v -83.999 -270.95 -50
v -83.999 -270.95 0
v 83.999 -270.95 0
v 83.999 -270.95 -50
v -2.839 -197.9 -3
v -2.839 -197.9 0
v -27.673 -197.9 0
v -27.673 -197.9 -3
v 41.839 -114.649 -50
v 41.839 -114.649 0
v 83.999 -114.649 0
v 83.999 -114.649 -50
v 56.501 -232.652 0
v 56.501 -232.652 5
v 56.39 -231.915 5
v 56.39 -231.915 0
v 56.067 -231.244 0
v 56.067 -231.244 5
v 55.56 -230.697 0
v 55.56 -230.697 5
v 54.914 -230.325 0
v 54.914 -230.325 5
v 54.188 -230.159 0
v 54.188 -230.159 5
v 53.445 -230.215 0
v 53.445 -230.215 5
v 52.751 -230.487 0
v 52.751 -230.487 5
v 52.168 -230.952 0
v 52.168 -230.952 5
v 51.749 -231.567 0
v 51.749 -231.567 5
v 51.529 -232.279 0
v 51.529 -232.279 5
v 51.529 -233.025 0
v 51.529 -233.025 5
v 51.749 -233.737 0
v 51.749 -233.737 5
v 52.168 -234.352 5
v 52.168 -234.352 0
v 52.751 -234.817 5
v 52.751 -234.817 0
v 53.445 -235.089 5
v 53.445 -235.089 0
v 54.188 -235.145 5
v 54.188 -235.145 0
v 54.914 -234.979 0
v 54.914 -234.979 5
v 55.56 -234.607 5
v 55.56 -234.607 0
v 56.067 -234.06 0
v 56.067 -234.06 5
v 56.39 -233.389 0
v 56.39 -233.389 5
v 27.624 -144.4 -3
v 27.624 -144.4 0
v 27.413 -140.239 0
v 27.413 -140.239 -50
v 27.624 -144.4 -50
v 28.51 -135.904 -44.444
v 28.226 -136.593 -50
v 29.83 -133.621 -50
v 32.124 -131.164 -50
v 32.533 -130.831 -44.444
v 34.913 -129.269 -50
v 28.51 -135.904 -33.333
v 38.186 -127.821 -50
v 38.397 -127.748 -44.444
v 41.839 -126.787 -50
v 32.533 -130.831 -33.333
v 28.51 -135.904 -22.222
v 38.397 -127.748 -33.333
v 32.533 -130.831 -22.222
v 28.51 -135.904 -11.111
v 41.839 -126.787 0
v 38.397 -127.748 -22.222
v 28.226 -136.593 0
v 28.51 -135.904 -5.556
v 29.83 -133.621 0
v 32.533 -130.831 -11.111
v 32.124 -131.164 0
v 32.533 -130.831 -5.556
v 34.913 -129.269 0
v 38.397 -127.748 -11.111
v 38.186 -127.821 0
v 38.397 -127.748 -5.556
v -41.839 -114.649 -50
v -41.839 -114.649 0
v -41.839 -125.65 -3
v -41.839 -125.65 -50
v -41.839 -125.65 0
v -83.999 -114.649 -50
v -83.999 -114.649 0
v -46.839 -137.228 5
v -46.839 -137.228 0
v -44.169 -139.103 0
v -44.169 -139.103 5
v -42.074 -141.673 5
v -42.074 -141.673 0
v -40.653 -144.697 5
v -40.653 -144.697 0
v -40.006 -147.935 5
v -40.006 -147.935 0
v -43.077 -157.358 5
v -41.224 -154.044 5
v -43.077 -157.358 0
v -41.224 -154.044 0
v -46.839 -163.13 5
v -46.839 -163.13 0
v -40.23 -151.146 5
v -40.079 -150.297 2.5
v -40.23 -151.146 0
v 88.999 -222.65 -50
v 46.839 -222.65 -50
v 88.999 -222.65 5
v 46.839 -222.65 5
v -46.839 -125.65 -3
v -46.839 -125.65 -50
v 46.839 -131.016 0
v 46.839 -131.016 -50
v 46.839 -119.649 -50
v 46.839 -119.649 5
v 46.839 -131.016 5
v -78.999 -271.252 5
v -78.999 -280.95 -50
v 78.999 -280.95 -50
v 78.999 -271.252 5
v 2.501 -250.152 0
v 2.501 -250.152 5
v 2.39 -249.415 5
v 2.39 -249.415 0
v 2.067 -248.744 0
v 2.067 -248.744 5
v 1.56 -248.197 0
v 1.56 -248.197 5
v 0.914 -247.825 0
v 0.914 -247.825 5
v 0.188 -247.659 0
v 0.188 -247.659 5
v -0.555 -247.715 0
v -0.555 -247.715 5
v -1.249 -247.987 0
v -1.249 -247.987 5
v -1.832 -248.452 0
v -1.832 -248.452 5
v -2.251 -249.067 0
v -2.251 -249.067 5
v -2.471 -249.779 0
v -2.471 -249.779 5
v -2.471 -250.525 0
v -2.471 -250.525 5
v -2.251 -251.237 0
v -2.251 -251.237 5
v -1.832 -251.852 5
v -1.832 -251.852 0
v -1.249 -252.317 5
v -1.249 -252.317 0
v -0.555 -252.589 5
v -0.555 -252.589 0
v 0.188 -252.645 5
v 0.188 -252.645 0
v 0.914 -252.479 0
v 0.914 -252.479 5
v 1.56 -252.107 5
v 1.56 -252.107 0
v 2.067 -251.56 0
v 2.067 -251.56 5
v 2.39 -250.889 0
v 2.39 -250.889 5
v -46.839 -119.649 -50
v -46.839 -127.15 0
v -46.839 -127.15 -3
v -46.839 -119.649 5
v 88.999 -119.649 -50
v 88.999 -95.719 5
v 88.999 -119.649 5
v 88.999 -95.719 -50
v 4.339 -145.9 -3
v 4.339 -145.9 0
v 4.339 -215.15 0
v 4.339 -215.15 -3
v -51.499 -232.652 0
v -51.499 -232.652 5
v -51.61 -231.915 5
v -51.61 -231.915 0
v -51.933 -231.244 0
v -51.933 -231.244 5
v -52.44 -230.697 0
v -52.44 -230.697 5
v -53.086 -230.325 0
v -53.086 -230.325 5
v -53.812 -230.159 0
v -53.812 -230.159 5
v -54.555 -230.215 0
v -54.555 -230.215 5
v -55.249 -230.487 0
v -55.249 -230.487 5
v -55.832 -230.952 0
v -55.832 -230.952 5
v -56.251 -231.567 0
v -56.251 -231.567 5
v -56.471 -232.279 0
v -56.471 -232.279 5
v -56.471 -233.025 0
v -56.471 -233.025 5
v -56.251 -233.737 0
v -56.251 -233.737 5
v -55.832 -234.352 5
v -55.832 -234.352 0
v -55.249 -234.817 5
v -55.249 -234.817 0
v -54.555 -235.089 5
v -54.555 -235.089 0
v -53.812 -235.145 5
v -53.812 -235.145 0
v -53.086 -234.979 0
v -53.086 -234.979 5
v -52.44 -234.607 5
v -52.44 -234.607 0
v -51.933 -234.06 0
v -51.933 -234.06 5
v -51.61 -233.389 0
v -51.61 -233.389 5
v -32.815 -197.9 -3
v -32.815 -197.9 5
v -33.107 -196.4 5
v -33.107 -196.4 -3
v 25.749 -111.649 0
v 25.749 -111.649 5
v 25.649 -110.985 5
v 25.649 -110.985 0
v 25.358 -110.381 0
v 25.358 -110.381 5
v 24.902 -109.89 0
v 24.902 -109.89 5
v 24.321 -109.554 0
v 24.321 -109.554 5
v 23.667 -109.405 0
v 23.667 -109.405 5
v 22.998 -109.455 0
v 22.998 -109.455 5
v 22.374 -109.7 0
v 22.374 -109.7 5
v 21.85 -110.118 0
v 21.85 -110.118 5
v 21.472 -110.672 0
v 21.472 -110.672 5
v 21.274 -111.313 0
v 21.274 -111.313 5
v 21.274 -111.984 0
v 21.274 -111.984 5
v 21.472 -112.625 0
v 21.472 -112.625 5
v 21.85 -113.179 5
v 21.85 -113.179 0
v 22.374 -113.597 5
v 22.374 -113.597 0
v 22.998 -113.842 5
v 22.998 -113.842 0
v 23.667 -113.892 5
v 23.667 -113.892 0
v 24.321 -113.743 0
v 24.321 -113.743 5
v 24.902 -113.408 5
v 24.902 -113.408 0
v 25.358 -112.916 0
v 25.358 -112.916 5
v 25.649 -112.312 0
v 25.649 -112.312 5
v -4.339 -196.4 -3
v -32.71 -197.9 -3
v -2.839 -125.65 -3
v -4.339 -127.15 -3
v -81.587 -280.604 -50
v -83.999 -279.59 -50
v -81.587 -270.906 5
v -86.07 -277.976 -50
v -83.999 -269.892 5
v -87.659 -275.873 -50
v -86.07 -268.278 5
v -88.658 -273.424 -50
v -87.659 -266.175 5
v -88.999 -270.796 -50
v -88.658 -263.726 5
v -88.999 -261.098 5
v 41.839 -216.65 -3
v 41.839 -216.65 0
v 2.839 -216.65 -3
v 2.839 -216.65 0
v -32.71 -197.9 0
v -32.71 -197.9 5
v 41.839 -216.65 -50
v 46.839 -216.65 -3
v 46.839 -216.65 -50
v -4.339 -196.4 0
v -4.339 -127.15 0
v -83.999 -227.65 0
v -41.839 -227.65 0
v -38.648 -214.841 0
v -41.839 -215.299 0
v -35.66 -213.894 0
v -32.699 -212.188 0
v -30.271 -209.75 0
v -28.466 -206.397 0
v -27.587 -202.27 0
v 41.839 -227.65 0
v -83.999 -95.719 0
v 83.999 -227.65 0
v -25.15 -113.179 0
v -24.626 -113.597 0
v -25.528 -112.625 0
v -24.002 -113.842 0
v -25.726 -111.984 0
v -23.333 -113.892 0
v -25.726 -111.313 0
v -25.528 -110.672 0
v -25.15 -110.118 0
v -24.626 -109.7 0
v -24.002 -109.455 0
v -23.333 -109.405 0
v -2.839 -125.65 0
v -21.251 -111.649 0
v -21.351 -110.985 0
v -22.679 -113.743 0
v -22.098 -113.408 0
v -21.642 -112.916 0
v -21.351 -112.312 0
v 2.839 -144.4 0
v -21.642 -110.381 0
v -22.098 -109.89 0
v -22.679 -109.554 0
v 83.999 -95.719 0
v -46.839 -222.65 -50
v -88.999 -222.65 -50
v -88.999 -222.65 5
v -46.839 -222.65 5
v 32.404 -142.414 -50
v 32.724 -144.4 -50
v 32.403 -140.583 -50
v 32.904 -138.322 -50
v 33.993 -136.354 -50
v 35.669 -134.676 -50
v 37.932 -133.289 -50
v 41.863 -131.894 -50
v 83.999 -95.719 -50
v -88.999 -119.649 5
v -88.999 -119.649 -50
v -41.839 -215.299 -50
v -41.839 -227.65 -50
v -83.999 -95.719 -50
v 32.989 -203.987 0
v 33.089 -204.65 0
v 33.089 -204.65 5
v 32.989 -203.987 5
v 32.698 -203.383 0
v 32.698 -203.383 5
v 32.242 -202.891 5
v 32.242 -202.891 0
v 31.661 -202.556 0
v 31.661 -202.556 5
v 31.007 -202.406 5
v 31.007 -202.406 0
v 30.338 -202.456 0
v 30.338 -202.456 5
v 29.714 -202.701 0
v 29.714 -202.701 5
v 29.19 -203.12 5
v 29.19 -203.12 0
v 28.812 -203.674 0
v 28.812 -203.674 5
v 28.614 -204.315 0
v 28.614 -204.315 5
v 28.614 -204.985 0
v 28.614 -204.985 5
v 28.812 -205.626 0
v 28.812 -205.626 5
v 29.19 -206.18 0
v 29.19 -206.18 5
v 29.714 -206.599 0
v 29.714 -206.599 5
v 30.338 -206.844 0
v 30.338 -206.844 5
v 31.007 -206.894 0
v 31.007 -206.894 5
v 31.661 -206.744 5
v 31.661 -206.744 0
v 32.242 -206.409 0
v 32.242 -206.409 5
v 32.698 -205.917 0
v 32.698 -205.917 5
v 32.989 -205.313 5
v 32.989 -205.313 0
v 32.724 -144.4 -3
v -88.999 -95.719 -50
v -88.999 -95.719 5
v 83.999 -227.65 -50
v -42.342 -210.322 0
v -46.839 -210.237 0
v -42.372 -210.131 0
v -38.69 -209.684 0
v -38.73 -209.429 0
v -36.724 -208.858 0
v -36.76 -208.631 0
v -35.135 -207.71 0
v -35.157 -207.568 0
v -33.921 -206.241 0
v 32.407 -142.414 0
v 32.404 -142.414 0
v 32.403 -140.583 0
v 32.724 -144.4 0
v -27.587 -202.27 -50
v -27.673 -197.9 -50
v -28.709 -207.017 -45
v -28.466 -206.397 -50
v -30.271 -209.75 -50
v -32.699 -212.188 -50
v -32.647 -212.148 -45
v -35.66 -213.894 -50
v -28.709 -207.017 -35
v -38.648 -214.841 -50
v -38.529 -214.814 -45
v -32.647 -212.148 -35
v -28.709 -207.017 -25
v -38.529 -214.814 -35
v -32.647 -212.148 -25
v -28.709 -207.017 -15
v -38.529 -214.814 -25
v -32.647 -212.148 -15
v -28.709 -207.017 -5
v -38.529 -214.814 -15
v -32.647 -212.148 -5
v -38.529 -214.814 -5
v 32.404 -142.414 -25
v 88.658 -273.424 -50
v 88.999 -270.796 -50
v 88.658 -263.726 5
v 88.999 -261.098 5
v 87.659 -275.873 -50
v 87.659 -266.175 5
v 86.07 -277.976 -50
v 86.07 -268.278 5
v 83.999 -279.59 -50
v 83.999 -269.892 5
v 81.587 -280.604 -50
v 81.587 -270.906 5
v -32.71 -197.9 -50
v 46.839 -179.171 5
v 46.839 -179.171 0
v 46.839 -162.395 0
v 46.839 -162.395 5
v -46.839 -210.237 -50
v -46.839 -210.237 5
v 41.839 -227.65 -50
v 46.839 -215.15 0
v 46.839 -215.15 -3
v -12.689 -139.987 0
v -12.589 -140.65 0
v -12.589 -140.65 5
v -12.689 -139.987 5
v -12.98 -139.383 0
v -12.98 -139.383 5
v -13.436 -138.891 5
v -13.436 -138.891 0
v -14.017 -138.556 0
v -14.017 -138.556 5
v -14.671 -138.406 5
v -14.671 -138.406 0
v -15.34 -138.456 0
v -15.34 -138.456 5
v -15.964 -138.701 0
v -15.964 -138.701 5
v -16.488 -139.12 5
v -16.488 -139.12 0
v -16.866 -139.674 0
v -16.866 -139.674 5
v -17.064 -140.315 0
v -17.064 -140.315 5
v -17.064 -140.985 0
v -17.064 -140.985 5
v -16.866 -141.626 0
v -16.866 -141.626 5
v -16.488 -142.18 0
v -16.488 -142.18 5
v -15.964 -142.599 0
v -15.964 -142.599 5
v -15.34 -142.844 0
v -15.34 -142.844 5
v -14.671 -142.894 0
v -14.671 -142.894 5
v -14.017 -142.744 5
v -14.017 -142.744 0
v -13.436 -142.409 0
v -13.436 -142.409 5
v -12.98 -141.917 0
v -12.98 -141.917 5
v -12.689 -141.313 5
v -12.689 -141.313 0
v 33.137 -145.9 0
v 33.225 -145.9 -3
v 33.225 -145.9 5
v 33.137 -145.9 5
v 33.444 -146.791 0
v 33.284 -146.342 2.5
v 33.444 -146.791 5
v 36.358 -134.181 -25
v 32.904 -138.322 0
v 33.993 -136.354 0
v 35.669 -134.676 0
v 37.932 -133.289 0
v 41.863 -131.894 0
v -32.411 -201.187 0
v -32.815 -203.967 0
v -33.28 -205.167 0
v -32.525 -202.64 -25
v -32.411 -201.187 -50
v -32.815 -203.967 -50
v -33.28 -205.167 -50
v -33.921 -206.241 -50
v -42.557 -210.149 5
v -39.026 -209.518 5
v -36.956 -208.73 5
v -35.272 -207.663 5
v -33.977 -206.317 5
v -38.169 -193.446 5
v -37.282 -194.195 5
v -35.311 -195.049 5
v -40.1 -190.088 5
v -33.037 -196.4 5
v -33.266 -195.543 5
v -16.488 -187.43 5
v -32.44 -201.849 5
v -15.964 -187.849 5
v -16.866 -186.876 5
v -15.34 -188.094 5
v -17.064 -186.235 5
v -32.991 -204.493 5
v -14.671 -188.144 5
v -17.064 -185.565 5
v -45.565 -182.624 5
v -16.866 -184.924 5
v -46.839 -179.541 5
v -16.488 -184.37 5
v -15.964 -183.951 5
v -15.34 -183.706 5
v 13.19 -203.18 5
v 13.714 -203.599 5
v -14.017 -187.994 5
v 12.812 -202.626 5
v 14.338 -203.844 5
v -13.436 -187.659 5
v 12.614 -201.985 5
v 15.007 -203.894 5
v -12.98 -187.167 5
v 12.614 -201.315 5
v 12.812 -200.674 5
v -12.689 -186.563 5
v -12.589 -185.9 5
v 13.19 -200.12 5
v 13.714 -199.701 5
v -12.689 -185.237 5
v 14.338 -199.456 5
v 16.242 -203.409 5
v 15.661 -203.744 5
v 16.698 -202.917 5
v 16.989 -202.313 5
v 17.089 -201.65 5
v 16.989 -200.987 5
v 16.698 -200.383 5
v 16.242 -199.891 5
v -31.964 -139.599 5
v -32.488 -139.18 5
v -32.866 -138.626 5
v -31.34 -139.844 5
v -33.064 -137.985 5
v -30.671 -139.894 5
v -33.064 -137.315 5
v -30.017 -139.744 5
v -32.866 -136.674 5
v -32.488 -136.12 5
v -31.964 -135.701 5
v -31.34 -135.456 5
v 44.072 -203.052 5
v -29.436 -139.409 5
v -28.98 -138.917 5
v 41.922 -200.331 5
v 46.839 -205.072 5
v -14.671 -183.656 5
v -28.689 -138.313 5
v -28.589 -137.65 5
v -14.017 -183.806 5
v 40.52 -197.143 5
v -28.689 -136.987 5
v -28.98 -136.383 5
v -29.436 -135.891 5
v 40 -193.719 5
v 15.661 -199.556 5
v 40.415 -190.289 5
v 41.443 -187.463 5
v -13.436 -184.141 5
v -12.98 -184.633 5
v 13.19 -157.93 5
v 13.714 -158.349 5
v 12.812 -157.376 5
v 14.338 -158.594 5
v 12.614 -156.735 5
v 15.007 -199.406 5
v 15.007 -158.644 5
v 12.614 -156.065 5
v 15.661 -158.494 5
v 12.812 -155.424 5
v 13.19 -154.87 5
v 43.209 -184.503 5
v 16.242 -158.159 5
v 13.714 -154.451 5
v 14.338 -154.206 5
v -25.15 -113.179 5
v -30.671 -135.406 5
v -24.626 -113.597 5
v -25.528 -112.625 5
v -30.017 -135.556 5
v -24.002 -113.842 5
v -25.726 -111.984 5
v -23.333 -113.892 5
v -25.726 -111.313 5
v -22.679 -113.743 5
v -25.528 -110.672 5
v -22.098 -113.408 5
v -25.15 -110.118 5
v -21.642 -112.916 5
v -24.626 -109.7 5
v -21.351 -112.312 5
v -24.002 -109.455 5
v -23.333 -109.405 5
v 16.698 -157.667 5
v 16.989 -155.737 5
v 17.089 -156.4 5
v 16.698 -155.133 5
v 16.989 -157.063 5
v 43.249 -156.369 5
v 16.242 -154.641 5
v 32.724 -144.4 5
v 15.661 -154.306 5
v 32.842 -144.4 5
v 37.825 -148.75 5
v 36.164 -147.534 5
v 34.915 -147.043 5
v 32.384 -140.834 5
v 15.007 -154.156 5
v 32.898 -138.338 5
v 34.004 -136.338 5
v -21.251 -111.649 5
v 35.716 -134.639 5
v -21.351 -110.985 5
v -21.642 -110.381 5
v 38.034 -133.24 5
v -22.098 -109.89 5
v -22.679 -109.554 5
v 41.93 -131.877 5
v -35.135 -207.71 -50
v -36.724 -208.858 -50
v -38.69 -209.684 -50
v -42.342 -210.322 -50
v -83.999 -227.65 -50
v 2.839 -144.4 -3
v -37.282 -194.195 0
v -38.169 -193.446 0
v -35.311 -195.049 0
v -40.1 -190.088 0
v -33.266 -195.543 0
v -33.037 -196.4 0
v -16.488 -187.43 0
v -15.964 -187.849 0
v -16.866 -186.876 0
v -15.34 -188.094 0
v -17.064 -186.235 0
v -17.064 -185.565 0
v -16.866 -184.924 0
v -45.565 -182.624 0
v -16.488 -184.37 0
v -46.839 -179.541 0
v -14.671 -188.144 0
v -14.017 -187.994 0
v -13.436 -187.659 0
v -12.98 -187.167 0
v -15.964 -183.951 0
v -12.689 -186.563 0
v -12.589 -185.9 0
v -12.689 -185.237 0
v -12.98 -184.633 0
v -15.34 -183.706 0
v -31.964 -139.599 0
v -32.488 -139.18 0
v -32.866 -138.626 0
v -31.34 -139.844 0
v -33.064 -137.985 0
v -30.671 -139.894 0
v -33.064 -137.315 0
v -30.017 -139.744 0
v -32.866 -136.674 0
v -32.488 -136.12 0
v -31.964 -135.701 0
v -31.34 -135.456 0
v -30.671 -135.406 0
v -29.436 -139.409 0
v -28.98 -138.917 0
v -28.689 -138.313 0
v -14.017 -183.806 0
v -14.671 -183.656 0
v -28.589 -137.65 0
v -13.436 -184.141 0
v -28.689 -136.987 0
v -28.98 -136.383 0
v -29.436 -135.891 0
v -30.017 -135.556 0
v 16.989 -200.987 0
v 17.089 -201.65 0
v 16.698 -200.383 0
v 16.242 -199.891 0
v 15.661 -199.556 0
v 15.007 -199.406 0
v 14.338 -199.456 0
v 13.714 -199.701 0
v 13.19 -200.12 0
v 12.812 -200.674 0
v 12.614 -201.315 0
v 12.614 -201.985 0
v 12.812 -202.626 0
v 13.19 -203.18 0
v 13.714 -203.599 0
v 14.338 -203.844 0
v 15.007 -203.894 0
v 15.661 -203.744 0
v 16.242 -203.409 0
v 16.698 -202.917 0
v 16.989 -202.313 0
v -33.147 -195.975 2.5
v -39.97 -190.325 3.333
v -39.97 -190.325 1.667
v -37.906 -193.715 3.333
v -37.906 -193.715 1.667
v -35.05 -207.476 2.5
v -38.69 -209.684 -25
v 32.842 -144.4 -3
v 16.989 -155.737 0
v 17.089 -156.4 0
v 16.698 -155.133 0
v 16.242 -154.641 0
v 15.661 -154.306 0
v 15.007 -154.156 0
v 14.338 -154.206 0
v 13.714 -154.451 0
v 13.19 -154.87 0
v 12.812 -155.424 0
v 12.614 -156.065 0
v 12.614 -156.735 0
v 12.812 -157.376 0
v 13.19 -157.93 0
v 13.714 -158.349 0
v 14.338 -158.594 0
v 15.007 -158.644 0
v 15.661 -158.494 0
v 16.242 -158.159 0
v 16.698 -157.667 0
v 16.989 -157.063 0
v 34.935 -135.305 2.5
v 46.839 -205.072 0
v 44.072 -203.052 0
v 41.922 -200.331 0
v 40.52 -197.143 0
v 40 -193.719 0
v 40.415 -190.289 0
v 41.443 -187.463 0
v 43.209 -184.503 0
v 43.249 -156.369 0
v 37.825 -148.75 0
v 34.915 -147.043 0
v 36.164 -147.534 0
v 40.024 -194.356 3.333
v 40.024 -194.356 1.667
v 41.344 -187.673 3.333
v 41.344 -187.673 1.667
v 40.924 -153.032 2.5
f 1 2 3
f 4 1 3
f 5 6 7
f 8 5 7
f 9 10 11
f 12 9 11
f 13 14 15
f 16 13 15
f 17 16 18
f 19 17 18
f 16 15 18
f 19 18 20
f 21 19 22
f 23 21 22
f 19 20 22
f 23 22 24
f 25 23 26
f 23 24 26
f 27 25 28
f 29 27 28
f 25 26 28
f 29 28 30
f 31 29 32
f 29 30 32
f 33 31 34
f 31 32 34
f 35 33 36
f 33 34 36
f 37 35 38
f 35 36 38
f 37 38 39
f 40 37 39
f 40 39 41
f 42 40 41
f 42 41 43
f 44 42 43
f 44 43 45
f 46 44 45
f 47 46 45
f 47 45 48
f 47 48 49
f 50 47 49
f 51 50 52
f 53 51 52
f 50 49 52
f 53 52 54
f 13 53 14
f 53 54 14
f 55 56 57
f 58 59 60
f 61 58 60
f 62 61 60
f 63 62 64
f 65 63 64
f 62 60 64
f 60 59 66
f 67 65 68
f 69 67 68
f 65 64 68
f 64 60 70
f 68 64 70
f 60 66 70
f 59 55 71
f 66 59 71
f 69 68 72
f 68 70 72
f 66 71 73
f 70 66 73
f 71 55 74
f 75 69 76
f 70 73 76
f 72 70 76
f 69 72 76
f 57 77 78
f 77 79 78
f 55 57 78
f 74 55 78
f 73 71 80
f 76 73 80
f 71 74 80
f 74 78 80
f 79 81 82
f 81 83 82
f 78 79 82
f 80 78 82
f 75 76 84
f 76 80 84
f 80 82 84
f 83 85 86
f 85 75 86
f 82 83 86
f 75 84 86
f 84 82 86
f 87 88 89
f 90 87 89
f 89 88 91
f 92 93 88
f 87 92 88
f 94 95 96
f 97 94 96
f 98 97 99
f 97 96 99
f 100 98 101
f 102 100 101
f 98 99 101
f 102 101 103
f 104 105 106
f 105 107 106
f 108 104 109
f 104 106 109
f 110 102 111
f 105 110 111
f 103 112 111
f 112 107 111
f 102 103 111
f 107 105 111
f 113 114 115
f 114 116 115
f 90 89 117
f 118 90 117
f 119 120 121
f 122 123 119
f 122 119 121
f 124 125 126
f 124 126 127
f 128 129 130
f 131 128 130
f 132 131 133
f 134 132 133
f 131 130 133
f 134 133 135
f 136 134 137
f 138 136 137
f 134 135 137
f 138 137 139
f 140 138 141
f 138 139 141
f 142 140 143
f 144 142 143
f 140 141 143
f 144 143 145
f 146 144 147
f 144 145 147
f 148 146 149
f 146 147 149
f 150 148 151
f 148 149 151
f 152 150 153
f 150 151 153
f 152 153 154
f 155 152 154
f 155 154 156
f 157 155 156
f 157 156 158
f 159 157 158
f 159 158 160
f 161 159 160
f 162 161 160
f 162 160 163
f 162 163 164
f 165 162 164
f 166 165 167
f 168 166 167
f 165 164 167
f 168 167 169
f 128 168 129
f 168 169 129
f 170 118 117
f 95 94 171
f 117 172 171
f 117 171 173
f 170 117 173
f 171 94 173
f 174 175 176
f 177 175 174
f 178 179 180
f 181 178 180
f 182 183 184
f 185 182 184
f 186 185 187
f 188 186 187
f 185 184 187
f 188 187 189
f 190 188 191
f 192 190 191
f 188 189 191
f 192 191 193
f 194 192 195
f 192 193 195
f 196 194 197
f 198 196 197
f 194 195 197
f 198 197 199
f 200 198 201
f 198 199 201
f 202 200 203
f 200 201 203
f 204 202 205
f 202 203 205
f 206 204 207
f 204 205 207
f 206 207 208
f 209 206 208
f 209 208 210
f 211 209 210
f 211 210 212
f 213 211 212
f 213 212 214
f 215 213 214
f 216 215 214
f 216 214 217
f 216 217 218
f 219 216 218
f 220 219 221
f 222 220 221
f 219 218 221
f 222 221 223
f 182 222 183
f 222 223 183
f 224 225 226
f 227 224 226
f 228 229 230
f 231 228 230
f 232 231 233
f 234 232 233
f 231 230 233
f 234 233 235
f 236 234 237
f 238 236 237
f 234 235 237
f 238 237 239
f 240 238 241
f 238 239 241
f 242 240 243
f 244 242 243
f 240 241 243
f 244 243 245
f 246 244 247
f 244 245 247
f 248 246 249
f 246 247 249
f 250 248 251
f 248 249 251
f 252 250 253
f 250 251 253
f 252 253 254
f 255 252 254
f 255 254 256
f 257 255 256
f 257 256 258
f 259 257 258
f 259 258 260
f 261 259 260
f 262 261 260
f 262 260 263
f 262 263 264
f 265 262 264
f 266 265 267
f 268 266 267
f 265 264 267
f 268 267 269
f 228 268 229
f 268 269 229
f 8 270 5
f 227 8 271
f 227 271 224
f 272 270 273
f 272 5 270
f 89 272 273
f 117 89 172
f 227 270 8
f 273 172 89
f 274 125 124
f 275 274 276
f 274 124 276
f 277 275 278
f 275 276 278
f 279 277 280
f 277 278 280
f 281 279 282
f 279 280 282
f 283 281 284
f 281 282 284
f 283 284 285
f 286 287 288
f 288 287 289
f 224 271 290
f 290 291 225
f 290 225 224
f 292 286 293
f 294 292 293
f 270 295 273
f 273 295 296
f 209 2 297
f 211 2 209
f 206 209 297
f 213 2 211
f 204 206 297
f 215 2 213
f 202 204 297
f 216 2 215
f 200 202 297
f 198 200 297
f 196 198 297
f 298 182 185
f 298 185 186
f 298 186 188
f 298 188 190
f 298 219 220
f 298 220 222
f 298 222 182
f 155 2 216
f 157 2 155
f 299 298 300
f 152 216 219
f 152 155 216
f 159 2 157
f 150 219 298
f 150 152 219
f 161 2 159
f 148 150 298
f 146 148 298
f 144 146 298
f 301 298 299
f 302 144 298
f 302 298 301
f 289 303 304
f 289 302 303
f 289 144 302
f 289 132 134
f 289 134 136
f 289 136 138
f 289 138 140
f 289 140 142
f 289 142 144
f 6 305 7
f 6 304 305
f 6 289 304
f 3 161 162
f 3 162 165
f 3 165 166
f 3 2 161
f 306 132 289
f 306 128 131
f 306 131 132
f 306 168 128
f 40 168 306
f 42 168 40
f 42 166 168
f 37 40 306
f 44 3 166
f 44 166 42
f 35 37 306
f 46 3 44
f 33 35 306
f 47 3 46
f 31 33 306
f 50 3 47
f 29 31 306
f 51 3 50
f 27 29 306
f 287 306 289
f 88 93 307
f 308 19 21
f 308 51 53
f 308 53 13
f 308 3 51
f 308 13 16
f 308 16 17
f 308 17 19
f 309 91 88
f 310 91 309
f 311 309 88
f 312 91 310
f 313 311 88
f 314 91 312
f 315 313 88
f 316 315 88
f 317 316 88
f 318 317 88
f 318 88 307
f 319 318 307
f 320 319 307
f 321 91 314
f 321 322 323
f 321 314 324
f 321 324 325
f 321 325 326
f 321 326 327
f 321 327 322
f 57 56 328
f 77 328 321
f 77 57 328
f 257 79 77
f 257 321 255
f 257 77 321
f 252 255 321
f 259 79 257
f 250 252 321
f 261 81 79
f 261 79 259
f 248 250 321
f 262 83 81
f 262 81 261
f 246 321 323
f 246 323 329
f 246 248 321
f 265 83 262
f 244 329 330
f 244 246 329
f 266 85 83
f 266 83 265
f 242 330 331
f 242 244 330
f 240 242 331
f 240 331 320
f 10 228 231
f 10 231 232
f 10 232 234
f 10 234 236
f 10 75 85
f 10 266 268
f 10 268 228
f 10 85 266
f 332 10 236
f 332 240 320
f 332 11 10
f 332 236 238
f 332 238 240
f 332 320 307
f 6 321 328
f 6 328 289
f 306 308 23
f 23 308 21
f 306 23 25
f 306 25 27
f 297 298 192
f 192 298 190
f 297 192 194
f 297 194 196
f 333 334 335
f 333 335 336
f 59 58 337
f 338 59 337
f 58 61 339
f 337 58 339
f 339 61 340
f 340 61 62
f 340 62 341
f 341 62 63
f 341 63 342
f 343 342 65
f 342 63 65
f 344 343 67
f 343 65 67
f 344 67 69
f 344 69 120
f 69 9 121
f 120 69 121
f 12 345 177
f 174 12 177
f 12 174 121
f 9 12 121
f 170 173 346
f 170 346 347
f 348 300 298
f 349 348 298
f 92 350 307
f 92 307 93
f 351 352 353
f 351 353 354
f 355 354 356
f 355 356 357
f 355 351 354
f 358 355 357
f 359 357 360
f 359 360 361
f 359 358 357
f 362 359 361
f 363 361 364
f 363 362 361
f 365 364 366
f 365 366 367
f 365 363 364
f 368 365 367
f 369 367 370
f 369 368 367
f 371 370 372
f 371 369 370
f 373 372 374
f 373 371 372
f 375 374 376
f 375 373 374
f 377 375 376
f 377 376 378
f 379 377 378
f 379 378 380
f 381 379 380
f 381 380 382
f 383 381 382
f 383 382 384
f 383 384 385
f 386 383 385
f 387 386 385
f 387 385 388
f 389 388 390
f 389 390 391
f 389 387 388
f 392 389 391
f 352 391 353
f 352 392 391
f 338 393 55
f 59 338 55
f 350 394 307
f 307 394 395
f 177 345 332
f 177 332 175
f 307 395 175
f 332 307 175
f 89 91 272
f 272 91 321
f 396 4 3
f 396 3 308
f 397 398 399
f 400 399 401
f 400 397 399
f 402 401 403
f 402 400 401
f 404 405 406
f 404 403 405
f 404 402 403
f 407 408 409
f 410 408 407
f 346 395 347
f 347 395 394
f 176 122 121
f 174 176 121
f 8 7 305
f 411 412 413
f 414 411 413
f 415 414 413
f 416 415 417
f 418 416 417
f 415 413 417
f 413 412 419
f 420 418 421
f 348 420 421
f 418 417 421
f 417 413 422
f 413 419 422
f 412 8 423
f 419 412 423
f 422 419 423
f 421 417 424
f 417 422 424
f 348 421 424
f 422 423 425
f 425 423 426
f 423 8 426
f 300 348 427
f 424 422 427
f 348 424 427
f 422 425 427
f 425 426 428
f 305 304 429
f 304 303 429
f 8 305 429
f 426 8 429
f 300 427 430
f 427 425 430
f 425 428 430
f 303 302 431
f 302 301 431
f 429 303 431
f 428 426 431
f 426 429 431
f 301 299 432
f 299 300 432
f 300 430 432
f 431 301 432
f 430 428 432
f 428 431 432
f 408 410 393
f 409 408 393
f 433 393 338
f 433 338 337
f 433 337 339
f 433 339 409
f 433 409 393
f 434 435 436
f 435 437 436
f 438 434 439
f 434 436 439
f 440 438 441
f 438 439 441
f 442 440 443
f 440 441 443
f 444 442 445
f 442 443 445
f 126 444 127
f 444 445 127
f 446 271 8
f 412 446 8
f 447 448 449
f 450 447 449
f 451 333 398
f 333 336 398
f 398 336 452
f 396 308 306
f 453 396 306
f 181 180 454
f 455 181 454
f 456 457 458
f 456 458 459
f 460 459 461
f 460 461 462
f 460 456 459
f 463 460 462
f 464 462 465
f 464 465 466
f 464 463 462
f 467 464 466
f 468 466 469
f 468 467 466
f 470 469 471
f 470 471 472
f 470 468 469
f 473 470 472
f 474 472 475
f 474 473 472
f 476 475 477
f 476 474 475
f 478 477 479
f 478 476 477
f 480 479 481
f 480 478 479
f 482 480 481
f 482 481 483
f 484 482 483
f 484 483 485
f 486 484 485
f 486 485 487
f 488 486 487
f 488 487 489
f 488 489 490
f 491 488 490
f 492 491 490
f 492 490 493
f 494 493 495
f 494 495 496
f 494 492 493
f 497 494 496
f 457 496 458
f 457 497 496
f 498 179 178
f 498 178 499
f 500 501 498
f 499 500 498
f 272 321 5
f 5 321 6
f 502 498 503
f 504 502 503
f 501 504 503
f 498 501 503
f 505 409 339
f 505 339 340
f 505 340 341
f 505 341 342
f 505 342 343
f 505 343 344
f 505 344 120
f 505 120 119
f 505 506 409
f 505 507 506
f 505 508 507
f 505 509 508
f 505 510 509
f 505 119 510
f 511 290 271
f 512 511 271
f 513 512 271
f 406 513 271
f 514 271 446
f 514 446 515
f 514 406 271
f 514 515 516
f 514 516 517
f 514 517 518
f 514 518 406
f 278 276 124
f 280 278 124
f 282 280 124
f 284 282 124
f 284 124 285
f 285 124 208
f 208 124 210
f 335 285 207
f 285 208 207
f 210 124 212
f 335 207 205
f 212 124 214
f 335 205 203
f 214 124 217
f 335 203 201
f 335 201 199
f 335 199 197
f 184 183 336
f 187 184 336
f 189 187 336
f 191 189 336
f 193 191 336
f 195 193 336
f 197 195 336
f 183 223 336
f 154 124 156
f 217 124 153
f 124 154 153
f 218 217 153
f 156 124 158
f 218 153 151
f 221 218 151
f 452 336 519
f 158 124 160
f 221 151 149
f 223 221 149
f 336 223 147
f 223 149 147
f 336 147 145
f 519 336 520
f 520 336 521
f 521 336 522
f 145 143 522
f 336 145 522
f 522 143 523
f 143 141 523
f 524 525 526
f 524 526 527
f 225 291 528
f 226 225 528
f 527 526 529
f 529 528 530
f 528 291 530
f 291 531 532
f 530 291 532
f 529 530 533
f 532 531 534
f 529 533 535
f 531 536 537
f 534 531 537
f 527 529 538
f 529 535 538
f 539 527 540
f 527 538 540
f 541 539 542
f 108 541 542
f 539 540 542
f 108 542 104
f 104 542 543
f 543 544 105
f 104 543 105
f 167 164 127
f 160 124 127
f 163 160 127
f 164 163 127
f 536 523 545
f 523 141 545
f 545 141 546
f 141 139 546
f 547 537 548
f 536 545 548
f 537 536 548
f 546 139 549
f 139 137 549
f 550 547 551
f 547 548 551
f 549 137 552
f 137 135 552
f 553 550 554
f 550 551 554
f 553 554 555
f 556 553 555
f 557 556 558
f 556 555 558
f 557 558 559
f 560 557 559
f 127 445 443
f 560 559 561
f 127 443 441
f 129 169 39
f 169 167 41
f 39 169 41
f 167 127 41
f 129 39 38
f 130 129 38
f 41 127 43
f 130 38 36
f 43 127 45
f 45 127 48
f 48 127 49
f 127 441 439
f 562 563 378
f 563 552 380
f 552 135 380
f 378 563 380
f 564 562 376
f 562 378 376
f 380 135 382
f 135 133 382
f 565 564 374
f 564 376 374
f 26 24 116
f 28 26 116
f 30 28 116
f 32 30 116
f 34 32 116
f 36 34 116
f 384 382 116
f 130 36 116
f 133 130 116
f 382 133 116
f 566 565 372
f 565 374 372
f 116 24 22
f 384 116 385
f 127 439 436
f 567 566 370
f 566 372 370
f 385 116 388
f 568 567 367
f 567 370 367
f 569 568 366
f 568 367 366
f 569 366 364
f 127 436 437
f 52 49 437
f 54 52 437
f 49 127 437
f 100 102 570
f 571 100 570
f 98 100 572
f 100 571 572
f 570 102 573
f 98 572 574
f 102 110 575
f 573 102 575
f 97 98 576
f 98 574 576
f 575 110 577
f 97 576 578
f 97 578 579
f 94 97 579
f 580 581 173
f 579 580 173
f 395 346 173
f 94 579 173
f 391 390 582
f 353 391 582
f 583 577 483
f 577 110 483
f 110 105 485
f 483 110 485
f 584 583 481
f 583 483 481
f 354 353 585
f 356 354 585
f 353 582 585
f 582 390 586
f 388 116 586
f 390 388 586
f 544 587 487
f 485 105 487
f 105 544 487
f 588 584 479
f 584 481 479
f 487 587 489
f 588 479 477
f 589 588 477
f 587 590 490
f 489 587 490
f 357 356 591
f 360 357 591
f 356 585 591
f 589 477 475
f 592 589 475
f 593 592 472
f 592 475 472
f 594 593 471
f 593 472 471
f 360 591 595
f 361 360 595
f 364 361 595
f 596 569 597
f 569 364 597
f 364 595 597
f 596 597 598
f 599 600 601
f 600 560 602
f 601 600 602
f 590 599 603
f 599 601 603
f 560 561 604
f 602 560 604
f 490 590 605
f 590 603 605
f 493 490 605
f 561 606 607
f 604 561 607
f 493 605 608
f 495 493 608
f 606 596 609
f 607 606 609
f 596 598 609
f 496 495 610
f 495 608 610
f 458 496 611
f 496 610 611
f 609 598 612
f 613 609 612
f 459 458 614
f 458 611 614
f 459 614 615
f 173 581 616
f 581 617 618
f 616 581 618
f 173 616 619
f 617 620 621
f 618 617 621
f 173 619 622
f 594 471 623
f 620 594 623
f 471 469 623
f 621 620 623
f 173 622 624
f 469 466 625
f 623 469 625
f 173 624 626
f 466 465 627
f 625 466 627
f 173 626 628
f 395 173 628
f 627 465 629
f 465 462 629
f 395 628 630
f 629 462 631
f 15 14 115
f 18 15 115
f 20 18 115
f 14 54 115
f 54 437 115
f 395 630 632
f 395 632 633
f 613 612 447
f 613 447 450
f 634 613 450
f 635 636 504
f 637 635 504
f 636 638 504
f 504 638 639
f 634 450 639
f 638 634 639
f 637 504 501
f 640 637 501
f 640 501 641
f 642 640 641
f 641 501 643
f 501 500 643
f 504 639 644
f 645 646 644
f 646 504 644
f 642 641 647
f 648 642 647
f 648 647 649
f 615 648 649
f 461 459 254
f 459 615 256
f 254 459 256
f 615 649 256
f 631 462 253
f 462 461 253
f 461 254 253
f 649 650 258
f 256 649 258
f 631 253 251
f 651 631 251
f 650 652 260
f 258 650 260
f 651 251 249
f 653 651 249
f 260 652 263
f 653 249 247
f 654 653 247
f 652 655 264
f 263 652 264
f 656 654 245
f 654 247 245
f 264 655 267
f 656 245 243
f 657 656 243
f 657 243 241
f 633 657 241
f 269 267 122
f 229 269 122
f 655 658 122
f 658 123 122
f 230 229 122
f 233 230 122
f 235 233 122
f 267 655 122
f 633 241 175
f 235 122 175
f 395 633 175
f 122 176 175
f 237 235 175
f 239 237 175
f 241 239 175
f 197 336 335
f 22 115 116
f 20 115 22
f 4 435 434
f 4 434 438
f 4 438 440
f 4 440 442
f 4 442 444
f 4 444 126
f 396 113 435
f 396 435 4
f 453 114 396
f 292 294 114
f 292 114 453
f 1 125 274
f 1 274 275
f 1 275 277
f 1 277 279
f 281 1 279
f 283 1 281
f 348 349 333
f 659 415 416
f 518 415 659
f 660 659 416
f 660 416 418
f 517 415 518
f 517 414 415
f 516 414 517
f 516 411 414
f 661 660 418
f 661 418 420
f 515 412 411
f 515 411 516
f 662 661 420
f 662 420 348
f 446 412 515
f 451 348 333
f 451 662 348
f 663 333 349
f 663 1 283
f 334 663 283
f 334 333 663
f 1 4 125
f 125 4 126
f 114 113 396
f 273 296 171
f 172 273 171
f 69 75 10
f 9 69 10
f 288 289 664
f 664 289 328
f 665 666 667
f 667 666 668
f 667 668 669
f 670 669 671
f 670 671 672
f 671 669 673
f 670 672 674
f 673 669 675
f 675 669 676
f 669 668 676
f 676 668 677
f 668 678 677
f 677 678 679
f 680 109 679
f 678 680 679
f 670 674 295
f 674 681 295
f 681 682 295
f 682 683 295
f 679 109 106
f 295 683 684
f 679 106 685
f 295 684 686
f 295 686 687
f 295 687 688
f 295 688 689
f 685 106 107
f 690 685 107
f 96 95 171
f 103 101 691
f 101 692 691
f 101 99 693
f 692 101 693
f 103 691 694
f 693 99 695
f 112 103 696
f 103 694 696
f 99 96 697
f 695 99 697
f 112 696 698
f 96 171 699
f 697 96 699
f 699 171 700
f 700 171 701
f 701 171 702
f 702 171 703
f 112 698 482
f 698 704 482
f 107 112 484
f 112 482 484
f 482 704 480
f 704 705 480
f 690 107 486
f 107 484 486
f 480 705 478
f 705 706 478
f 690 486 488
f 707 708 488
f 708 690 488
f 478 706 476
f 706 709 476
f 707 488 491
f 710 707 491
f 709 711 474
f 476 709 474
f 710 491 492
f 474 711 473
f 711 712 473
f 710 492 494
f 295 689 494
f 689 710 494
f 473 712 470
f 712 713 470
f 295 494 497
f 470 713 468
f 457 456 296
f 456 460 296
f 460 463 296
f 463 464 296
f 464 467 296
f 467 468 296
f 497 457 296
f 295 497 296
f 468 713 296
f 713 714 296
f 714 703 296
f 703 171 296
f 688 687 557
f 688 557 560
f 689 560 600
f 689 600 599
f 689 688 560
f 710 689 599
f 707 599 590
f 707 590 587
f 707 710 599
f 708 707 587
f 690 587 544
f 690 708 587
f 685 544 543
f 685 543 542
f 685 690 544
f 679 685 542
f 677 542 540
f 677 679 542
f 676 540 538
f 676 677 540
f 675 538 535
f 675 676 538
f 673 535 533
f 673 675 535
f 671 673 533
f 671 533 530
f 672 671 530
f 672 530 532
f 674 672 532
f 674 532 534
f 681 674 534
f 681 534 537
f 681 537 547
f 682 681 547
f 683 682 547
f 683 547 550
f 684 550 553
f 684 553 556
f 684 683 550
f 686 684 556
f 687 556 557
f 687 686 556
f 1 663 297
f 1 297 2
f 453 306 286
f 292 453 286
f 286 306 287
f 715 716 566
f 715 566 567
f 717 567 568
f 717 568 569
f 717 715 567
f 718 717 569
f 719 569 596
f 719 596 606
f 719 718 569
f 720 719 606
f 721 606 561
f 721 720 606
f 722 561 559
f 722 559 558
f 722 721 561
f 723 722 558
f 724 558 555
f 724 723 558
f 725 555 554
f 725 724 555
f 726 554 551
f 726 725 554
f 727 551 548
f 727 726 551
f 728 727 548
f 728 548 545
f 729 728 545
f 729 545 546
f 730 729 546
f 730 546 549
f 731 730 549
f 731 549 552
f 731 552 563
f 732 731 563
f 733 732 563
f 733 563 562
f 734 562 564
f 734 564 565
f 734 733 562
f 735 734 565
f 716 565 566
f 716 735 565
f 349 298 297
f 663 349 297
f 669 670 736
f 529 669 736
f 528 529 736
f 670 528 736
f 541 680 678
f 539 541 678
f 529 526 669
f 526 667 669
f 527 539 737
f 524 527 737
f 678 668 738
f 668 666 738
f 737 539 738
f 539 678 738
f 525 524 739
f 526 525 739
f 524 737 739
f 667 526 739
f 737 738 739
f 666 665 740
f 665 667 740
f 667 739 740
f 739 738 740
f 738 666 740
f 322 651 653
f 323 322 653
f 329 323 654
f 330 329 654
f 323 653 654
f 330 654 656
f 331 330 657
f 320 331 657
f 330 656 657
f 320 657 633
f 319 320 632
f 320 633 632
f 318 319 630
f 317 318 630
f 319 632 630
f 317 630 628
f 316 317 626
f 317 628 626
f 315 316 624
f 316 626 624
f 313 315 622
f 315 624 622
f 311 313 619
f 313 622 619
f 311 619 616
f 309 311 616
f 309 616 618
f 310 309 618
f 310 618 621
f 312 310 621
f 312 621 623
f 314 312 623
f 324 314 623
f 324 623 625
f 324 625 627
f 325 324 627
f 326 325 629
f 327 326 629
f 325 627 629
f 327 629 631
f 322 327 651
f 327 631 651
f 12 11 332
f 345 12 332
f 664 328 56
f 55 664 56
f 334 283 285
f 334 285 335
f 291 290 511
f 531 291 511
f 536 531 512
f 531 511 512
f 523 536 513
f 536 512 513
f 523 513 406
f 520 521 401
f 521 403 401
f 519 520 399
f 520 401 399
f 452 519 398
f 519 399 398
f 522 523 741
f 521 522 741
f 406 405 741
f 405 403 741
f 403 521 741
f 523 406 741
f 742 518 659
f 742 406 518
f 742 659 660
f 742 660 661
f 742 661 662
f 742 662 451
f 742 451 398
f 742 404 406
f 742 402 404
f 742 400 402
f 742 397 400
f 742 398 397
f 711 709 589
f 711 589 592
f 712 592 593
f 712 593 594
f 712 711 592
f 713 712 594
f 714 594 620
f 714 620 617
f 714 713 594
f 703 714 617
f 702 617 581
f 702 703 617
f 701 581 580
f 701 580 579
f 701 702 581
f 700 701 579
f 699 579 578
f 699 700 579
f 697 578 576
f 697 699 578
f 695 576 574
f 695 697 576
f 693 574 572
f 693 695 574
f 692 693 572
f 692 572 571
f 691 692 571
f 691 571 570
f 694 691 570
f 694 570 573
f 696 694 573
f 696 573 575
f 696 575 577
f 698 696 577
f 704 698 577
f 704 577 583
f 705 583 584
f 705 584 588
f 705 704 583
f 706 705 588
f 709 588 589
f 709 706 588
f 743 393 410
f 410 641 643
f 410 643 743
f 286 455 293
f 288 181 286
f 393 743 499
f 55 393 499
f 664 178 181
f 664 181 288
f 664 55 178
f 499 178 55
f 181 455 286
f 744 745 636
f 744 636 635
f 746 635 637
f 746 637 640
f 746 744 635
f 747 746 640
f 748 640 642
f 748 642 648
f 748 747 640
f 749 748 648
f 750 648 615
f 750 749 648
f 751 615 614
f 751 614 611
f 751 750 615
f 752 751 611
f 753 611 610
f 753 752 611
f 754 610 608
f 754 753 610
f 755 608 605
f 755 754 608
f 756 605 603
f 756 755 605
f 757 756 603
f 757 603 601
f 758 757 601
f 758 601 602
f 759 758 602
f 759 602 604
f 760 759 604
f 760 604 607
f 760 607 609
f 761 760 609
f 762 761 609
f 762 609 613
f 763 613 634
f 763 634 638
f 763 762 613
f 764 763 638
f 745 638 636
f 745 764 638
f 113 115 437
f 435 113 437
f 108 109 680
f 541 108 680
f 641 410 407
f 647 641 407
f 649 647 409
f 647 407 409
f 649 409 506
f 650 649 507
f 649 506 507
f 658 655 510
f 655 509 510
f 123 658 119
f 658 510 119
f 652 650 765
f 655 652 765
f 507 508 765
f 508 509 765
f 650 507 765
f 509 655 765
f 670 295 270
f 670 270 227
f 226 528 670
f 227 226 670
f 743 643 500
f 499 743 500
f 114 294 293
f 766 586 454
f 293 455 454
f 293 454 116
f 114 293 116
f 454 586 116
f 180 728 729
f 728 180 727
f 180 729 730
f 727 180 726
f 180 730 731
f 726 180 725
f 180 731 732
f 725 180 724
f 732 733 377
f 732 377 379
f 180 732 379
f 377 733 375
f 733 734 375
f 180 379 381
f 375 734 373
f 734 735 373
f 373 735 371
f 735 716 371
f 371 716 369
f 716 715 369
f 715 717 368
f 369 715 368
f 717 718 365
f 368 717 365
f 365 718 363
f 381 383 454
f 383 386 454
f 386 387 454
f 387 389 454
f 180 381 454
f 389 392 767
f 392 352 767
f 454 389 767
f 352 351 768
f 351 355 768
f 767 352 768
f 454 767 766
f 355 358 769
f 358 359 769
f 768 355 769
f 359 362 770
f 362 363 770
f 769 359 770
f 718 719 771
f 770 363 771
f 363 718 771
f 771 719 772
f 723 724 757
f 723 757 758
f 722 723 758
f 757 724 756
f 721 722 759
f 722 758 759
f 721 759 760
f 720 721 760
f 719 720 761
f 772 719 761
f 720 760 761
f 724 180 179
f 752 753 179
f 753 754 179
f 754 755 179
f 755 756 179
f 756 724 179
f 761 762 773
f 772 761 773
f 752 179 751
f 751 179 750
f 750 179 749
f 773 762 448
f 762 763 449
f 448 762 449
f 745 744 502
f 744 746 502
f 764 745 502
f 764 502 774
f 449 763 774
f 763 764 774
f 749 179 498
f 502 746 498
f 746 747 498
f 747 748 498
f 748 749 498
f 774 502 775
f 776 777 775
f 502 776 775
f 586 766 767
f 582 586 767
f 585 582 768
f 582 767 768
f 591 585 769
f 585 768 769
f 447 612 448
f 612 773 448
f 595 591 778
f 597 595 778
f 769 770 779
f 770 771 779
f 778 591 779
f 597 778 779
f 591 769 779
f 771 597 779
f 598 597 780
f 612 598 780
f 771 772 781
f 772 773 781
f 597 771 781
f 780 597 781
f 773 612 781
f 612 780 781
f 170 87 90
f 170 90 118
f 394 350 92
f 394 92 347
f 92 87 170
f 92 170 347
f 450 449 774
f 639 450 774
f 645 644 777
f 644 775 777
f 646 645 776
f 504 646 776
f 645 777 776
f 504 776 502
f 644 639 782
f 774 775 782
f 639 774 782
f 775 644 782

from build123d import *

# Parameters (mm, degrees)
SKETCH1_R            = 2.25
BOSS_EXTRUDE1_DEPTH  = 5
SKETCH7_R            = 2
CUT_EXTRUDE1_DEPTH   = 10
SKETCH10_W           = 93.677769422
SKETCH10_H           = 89.648680449
CUT_EXTRUDE4_DEPTH   = 10
LPATTERN1_COUNT      = 2
LPATTERN1_PITCH      = 144.65
SKETCH13_W           = 93.677769422
SKETCH13_H           = 54.298680449
BOSS_EXTRUDE2_DEPTH  = 5
SKETCH18_W           = 93.677769422
SKETCH18_H           = 5
BOSS_EXTRUDE5_DEPTH  = 5
BOSS_EXTRUDE7_DEPTH  = 8
SKETCH19_W           = 93.677769422
SKETCH19_H           = 5
BOSS_EXTRUDE8_DEPTH  = 61.3
SKETCH21_W           = 93.677769422
SKETCH21_H           = 5
BOSS_EXTRUDE9_DEPTH  = 3
BOSS_EXTRUDE10_DEPTH = 50
SKETCH25_W           = 93.677769422
SKETCH25_H           = 119.069948178
CUT_EXTRUDE6_DEPTH   = 55
SKETCH29_W           = 5
SKETCH29_H           = 58.3
SKETCH29_H_2         = 23.93
BOSS_EXTRUDE12_DEPTH = 42.16
SKETCH34_R           = 2.25
CUT_EXTRUDE10_DEPTH  = 5
BOSS_EXTRUDE13_DEPTH = 50
CUT_EXTRUDE11_DEPTH  = 177.997769422
FILLET1_R            = 10
SKETCH38_R           = 2.5
CUT_EXTRUDE12_DEPTH  = 5


# Read off the part's stored shape, not the designer's step: Boss-Extrude10
with BuildPart() as part:
    # Sketch1 → Boss-Extrude1 (new body)
    with BuildSketch(Plane.XY):
        with BuildLine():
            Line((0, 110), (-46.838884711, 110))
            Line((-46.838884711, 110), (-46.838884711, 100.421650596))
            add(Edge.make_bspline(
                [(-46.838884711, 100.421650596), (-42.226362844, 98.141206473), (-36.711667831, 86.910333368), (-44.527260711, 78.55539065), (-46.838884711, 74.520163403)],
                knots=[0, 0, 0, 0, 0.5133871, 0.998542736, 0.998542736, 0.998542736, 0.998542736], degree=3))
            Line((-46.838884711, 74.520163403), (-46.838884711, 58.109446399))
            add(Edge.make_bspline(
                [(-46.838884711, 58.109446399), (-45.758632516, 53.655222634), (-40.885867203, 50.40646242), (-38.238529072, 43.136574556), (-34.782140744, 42.431604419), (-33.266055192, 42.106985538)],
                knots=[0, 0, 0, 0, 0.587735064, 0.769686025, 1, 1, 1, 1], degree=3))
            add(Edge.make_bspline(
                [(-33.266055192, 42.106985538), (-28.892413212, 26.709459558), (-46.838884711, 27.412777151)],
                knots=[0, 0, 0, 1, 1, 1], degree=2))
            Line((-46.838884711, 27.412777151), (-46.838884711, 7.421650596))
            add(Edge.make_bspline(
                [(-46.838884711, 7.421650596), (-42.226362844, 5.141206473), (-36.711667831, -6.089666632), (-44.527260711, -14.44460935), (-46.838884711, -18.479836597)],
                knots=[0, 0, 0, 0, 0.5133871, 0.998542736, 0.998542736, 0.998542736, 0.998542736], degree=3))
            Line((-46.838884711, -18.479836597), (-46.838884711, -34.890553601))
            add(Edge.make_bspline(
                [(-46.838884711, -34.890553601), (-45.758632516, -39.344777366), (-40.885867203, -42.59353758), (-38.238529072, -49.863425444), (-34.782140744, -50.568395581), (-33.266055192, -50.893014462)],
                knots=[0, 0, 0, 0, 0.587735064, 0.769686025, 1, 1, 1, 1], degree=3))
            add(Edge.make_bspline(
                [(-33.266055192, -50.893014462), (-28.892413212, -66.290540442), (-46.838884711, -65.587222849)],
                knots=[0, 0, 0, 1, 1, 1], degree=2))
            Line((-46.838884711, -65.587222849), (-46.838884711, -70))
            Line((-46.838884711, -70), (0, -70))
            Line((0, -70), (46.838884711, -70))
            Line((46.838884711, -70), (46.838884711, -60.421650596))
            add(Edge.make_bspline(
                [(46.838884711, -60.421650596), (42.982832164, -58.395834606), (38.906182163, -51.871311027), (41.138601483, -41.632996987), (45.188996373, -37.461060264), (46.838884711, -34.520947075)],
                knots=[0, 0, 0, 0, 0.434931401, 0.661677592, 0.998582109, 0.998582109, 0.998582109, 0.998582109], degree=3))
            Line((46.838884711, -34.520947075), (46.838884711, -17.744628899))
            add(Edge.make_bspline(
                [(46.838884711, -17.744628899), (45.396033977, -14.277729688), (40.758990778, -9.004665614), (37.573327769, -2.447994476), (33.443642317, -2.141285146)],
                knots=[0, 0, 0, 0, 0.525454982, 1, 1, 1, 1], degree=3))
            add(Edge.make_bspline(
                [(33.443642317, -2.141285146), (28.416523532, 11.559488336), (46.838884711, 13.634393344)],
                knots=[0, 0, 0, 1, 1, 1], degree=2))
            Line((46.838884711, 13.634393344), (46.838884711, 32.578349404))
            add(Edge.make_bspline(
                [(46.838884711, 32.578349404), (42.982832164, 34.604165394), (38.906182163, 41.128688973), (41.138601483, 51.367003013), (45.188996373, 55.538939736), (46.838884711, 58.479052925)],
                knots=[0, 0, 0, 0, 0.434931401, 0.661677592, 0.998582109, 0.998582109, 0.998582109, 0.998582109], degree=3))
            Line((46.838884711, 58.479052925), (46.838884711, 75.255371101))
            add(Edge.make_bspline(
                [(46.838884711, 75.255371101), (45.396033977, 78.722270312), (40.758990778, 83.995334386), (37.573327769, 90.552005524), (33.443642317, 90.858714854)],
                knots=[0, 0, 0, 0, 0.525454982, 1, 1, 1, 1], degree=3))
            Line((33.443642317, 90.858714854), (0, 110))
        make_face()
        with Locations((-14.838884711, -41.25)):
            Circle(SKETCH1_R, mode=Mode.SUBTRACT)
        with Locations((-30.838884711, 7)):
            Circle(SKETCH1_R, mode=Mode.SUBTRACT)
        with Locations((-14.838884711, 4)):
            Circle(SKETCH1_R, mode=Mode.SUBTRACT)
        with Locations((14.838884711, -57)):
            Circle(SKETCH1_R, mode=Mode.SUBTRACT)
        with Locations((30.838884711, -60)):
            Circle(SKETCH1_R, mode=Mode.SUBTRACT)
        with Locations((14.838884711, -11.75)):
            Circle(SKETCH1_R, mode=Mode.SUBTRACT)
        with Locations((-14.838884711, 51.75)):
            Circle(SKETCH1_R, mode=Mode.SUBTRACT)
        with Locations((-30.838884711, 100)):
            Circle(SKETCH1_R, mode=Mode.SUBTRACT)
        with Locations((-14.838884711, 97)):
            Circle(SKETCH1_R, mode=Mode.SUBTRACT)
        with Locations((14.838884711, 36)):
            Circle(SKETCH1_R, mode=Mode.SUBTRACT)
        with Locations((30.838884711, 33)):
            Circle(SKETCH1_R, mode=Mode.SUBTRACT)
        with Locations((14.838884711, 81.25)):
            Circle(SKETCH1_R, mode=Mode.SUBTRACT)
    extrude(amount=BOSS_EXTRUDE1_DEPTH)

    # Sketch7 → Cut-Extrude1 (cut)
    with BuildSketch(Plane.XY.offset(5)):
        with Locations((-41.838884711, 23.5)):
            Circle(SKETCH7_R)
        with Locations((-41.838884711, 67)):
            Circle(SKETCH7_R)
        with Locations((40.861115289, 67)):
            Circle(SKETCH7_R)
        with Locations((40.861115289, 23.5)):
            Circle(SKETCH7_R)
    extrude(amount=-CUT_EXTRUDE1_DEPTH, mode=Mode.SUBTRACT)

    # Sketch10 → Cut-Extrude4 (cut)
    with BuildSketch(Plane.XY.offset(5)):
        with Locations((0, 65.175659775)):
            Rectangle(SKETCH10_W, SKETCH10_H)
    extrude(amount=-CUT_EXTRUDE4_DEPTH, mode=Mode.SUBTRACT)


with BuildPart() as lpattern1_1:
    # LPattern1: pattern copy
    add(part.part.moved(Location(Vector(0, -1, 0) * (1 * LPATTERN1_PITCH))))


with BuildPart() as part_1:
    add(part.part)

    add(lpattern1_1.part)  # Boss-Extrude2 merges LPattern1_1
    # Sketch13 → Boss-Extrude2 (add)
    with BuildSketch(Plane.XY.offset(5)):
        with Locations((0, -97.149340225)):
            Rectangle(SKETCH13_W, SKETCH13_H)
    extrude(amount=-BOSS_EXTRUDE2_DEPTH)

    # Sketch18 → Boss-Extrude5 (add)
    with BuildSketch(Plane.XY.offset(5)):
        with Locations((0, -217.15)):
            Rectangle(SKETCH18_W, SKETCH18_H)
    extrude(amount=-BOSS_EXTRUDE5_DEPTH)

    # Sketch17 → Boss-Extrude7 (add)
    with BuildSketch(Plane.XY.offset(5)):
        Polygon((33.137486483, -1.25), (4.338884711, -1.25), (4.338884711, -70.5), (46.838884711, -70.5), (46.838884711, -72), (2.838884711, -72), (2.838884711, 0.25), (32.841973097, 0.25), (33.225056852, -1.25), align=None)
        Polygon((-33.036788629, -51.75), (-4.338884711, -51.75), (-4.338884711, 17.5), (-46.838884711, 17.5), (-46.838884711, 19), (-2.838884711, 19), (-2.838884711, -53.25), (-32.814550412, -53.25), (-33.107034097, -51.75), align=None)
        Polygon((-33.036788629, -196.4), (-4.338884711, -196.4), (-4.338884711, -127.15), (-46.838884711, -127.15), (-46.838884711, -125.65), (-2.838884711, -125.65), (-2.838884711, -197.9), (-32.814550412, -197.9), (-33.107034097, -196.4), align=None)
        Polygon((33.137486483, -145.9), (4.338884711, -145.9), (4.338884711, -215.15), (46.838884711, -215.15), (46.838884711, -216.65), (2.838884711, -216.65), (2.838884711, -144.4), (32.841973097, -144.4), (33.225056852, -145.9), align=None)
    extrude(amount=-BOSS_EXTRUDE7_DEPTH)

    # Sketch19 → Boss-Extrude8 (add)
    with BuildSketch(Plane.XZ.offset(219.65)):
        with Locations((0, 2.5)):
            Rectangle(SKETCH19_W, SKETCH19_H)
    extrude(amount=BOSS_EXTRUDE8_DEPTH)

    # Sketch21 → Boss-Extrude9 (add)
    with BuildSketch(Plane(origin=(0, 20.351319551, 0), x_dir=(1, 0, 0), z_dir=(0, 1, 0))):
        with Locations((0, -2.5)):
            Rectangle(SKETCH21_W, SKETCH21_H)
    extrude(amount=BOSS_EXTRUDE9_DEPTH)

    # Boss-Extrude10 outline → Boss-Extrude10 (add)
    with BuildSketch(Plane(origin=(0, 0, 0), x_dir=(-1, 0, 0), z_dir=(0, 0, -1))):
        with BuildLine():
            add(Edge.make_bspline(
                [(-32.724261898, 0.25), (-32.245095706, 2.312784936), (-32.402626668, 4.067426464)],
                knots=[0, 0, 0, 0.181136716, 0.181136716, 0.181136716], degree=2))
            Line((-32.724261898, 0.25), (-29.65751977, 0.25))
            add(Edge.make_bspline(
                [(-29.65751977, 0.25), (-29.601842647, 0.538366952), (-29.466363581, 1.344697446), (-29.301208708, 3.141766485), (-29.47061633, 5.619429231), (-30.412970229, 8.408598154), (-32.080129332, 10.83738709), (-34.332026266, 12.794823629), (-37.046086715, 14.308755459), (-39.670197714, 15.260630902), (-41.969837518, 15.859321379), (-43.221486034, 16.113254715), (-43.838884711, 16.22336356)],
                knots=[0.025422655, 0.025422655, 0.025422655, 0.025422655, 0.057672577, 0.115345154, 0.230690308, 0.346035462, 0.461380617, 0.576725771, 0.692070925, 0.807416079, 0.865088656, 0.922761233, 0.922761233, 0.922761233, 0.922761233], degree=3))
            Line((-43.838884711, 16.22336356), (-43.838884711, 20.351319551))
            Line((-43.838884711, 20.351319551), (43.838884711, 20.351319551))
            Line((43.838884711, 20.351319551), (43.838884711, 19))
            Line((43.838884711, 19), (46.838884711, 19))
            Line((46.838884711, 19), (46.838884711, 23.351319551))
            Line((46.838884711, 23.351319551), (-46.838884711, 23.351319551))
            Line((-46.838884711, 23.351319551), (-46.838884711, 13.634393344))
            add(Edge.make_bspline(
                [(-32.402626668, 4.067426464), (-33.094751911, 12.086395793), (-46.838884711, 13.634393344)],
                knots=[0.25394293, 0.25394293, 0.25394293, 1, 1, 1], degree=2))
        make_face()
        with BuildLine():
            add(Edge.make_bspline(
                [(32.709776931, -53.25), (31.734780647, -58.560461643), (33.920713563, -61.590754477)],
                knots=[0.079873384, 0.079873384, 0.079873384, 0.456195017, 0.456195017, 0.456195017], degree=2))
            Line((32.709776931, -53.25), (27.672993194, -53.25))
            add(Edge.make_bspline(
                [(27.672993194, -53.25), (27.634044039, -53.603919753), (27.549470722, -54.53429273), (27.478130031, -56.55603599), (27.696443256, -59.281114668), (28.584970164, -62.41153087), (30.219766888, -65.27653857), (32.567186832, -67.613698936), (35.393773129, -69.256198214), (37.979457465, -70.085815151), (40.144646291, -70.485795849), (41.276481585, -70.607362141), (41.838884711, -70.649060215)],
                knots=[0.020227728, 0.020227728, 0.020227728, 0.020227728, 0.052559154, 0.105118307, 0.210236615, 0.315354922, 0.42047323, 0.525591537, 0.630709845, 0.735828152, 0.788387306, 0.840946459, 0.840946459, 0.840946459, 0.840946459], degree=3))
            Line((41.838884711, -70.649060215), (46.838884711, -70.649060215))
            Line((46.838884711, -70.649060215), (46.838884711, -65.587222848))
            add(Edge.make_bspline(
                [(33.920713563, -61.590754477), (36.999202525, -66.479878046), (46.838884711, -65.587222848)],
                knots=[0.383965009, 0.383965009, 0.383965009, 1, 1, 1], degree=2))
        make_face()
        with BuildLine():
            add(Edge.make_bspline(
                [(-32.724261899, -144.4), (-32.245095735, -142.337215187), (-32.40262665, -140.582573745)],
                knots=[0, 0, 0, 0.181136705, 0.181136705, 0.181136705], degree=2))
            Line((-32.724261899, -144.4), (-27.624350546, -144.4))
            add(Edge.make_bspline(
                [(-27.624350546, -144.4), (-27.502918691, -143.696257513), (-27.293028635, -141.891316279), (-27.435749972, -139.015823852), (-28.37747966, -135.845139515), (-30.113029916, -133.024976386), (-32.462833621, -130.741878365), (-35.232498366, -128.995170141), (-37.82646734, -127.905854752), (-40.056119375, -127.214276507), (-41.247409264, -126.918228045), (-41.838884711, -126.786845404)],
                knots=[0.038284512, 0.038284512, 0.038284512, 0.038284512, 0.109248652, 0.218497304, 0.327745955, 0.436994607, 0.546243259, 0.655491911, 0.764740563, 0.819364888, 0.873989214, 0.873989214, 0.873989214, 0.873989214], degree=3))
            Line((-41.838884711, -126.786845404), (-46.838884711, -126.786845404))
            Line((-46.838884711, -126.786845404), (-46.838884711, -131.015606656))
            add(Edge.make_bspline(
                [(-32.40262665, -140.582573745), (-33.094751732, -132.563604227), (-46.838884711, -131.015606656)],
                knots=[0.25394292, 0.25394292, 0.25394292, 1, 1, 1], degree=2))
        make_face()
        with BuildLine():
            add(Edge.make_bspline(
                [(32.709776931, -197.9), (31.734780645, -203.210461655), (33.920713573, -206.240754491)],
                knots=[0.079873384, 0.079873384, 0.079873384, 0.456195018, 0.456195018, 0.456195018], degree=2))
            Line((32.709776931, -197.9), (27.672993196, -197.9))
            add(Edge.make_bspline(
                [(27.672993196, -197.9), (27.63404404, -198.253919753), (27.549470724, -199.184292729), (27.478130032, -201.206035989), (27.696443257, -203.931114667), (28.584970165, -207.061530869), (30.219766889, -209.926538569), (32.567186833, -212.263698935), (35.393773129, -213.906198214), (37.979457465, -214.73581515), (40.144646291, -215.135795849), (41.276481585, -215.25736214), (41.838884711, -215.299060215)],
                knots=[0.020227728, 0.020227728, 0.020227728, 0.020227728, 0.052559154, 0.105118307, 0.210236615, 0.315354922, 0.42047323, 0.525591537, 0.630709845, 0.735828152, 0.788387306, 0.84094646, 0.84094646, 0.84094646, 0.84094646], degree=3))
            Line((41.838884711, -215.299060215), (46.838884711, -215.299060215))
            Line((46.838884711, -215.299060215), (46.838884711, -210.237222849))
            add(Edge.make_bspline(
                [(33.920713573, -206.240754491), (36.999202539, -211.129878044), (46.838884711, -210.237222849)],
                knots=[0.38396501, 0.38396501, 0.38396501, 1, 1, 1], degree=2))
        make_face()
    extrude(amount=BOSS_EXTRUDE10_DEPTH)

    # Sketch25 → Cut-Extrude6 (cut)
    with BuildSketch(Plane.XY.offset(5)):
        with Locations((0, -36.183654538)):
            Rectangle(SKETCH25_W, SKETCH25_H)
    extrude(amount=-CUT_EXTRUDE6_DEPTH, mode=Mode.SUBTRACT)

    # Sketch29 → Boss-Extrude12 (add)
    with BuildSketch(Plane(origin=(46.838884711, 0, 0), x_dir=(0, 0, -1), z_dir=(1, 0, 0))):
        with Locations((-2.5, -251.8)):
            Rectangle(SKETCH29_W, SKETCH29_H)
        with Locations((-2.5, -107.683628627)):
            Rectangle(SKETCH29_W, SKETCH29_H_2)
    boss_extrude12 = extrude(amount=BOSS_EXTRUDE12_DEPTH)

    # Mirror1: Boss-Extrude12 across plane
    add(boss_extrude12.mirror(Plane(origin=(0, 0, 0), x_dir=(0, 0, 1), z_dir=(1, 0, 0))))

    # Sketch34 → Cut-Extrude10 (cut)
    with BuildSketch(Plane.XY.offset(5)):
        with Locations((-23.501115289, -111.648680449)):
            Circle(SKETCH34_R)
        with Locations((23.498884711, -111.648680449)):
            Circle(SKETCH34_R)
    extrude(amount=-CUT_EXTRUDE10_DEPTH, mode=Mode.SUBTRACT)

    # Sketch35 → Boss-Extrude13 (add)
    with BuildSketch(Plane(origin=(0, 0, 0), x_dir=(-1, 0, 0), z_dir=(0, 0, -1))):
        Polygon((-41.838884711, -216.65), (-46.838884711, -216.65), (-46.838884711, -222.65), (-88.998884711, -222.65), (-88.998884711, -280.95), (88.998884711, -280.95), (88.998884711, -222.65), (46.838884711, -222.65), (46.838884711, -215.299060215), (41.838884711, -215.299060215), (41.838884711, -227.65), (83.998884711, -227.65), (83.998884711, -270.95), (-83.998884711, -270.95), (-83.998884711, -227.65), (-41.838884711, -227.65), align=None)
        Polygon((-46.838884711, -119.648628627), (-46.838884711, -126.786845404), (-41.838884711, -126.786845404), (-41.838884711, -114.648628627), (-83.998884711, -114.648628627), (-83.998884711, -95.718628627), (-88.998884711, -95.718628627), (-88.998884711, -119.648628627), align=None)
        Polygon((88.998884711, -95.718628627), (83.998884711, -95.718628627), (83.998884711, -114.648628627), (41.838884711, -114.648628627), (41.838884711, -125.65), (46.838884711, -125.65), (46.838884711, -119.648628627), (88.998884711, -119.648628627), align=None)
    extrude(amount=BOSS_EXTRUDE13_DEPTH)

    # Sketch36 → Cut-Extrude11 (cut)
    with BuildSketch(Plane.ZY.offset(88.998884711)):
        Polygon((-50, -280.95), (5, -271.252016061), (5, -280.95), align=None)
    extrude(amount=-CUT_EXTRUDE11_DEPTH, mode=Mode.SUBTRACT)

    # Fillet1
    fillet1_edges = [part_1.edges().sort_by_distance(p)[0] for p in [
        (-88.998884711, -276.101008031, -22.5),
        (88.998884711, -276.101008031, -22.5),
    ]]
    fillet(fillet1_edges, radius=FILLET1_R)

    # Sketch38 → Cut-Extrude12 (cut)
    with BuildSketch(Plane.XY.offset(5)):
        with Locations((-53.998884711, -232.652016061)):
            Circle(SKETCH38_R)
        with Locations((0.001115289, -250.152016061)):
            Circle(SKETCH38_R)
        with Locations((54.001115289, -232.652016061)):
            Circle(SKETCH38_R)
    extrude(amount=-CUT_EXTRUDE12_DEPTH, mode=Mode.SUBTRACT)


solid = part_1.part
